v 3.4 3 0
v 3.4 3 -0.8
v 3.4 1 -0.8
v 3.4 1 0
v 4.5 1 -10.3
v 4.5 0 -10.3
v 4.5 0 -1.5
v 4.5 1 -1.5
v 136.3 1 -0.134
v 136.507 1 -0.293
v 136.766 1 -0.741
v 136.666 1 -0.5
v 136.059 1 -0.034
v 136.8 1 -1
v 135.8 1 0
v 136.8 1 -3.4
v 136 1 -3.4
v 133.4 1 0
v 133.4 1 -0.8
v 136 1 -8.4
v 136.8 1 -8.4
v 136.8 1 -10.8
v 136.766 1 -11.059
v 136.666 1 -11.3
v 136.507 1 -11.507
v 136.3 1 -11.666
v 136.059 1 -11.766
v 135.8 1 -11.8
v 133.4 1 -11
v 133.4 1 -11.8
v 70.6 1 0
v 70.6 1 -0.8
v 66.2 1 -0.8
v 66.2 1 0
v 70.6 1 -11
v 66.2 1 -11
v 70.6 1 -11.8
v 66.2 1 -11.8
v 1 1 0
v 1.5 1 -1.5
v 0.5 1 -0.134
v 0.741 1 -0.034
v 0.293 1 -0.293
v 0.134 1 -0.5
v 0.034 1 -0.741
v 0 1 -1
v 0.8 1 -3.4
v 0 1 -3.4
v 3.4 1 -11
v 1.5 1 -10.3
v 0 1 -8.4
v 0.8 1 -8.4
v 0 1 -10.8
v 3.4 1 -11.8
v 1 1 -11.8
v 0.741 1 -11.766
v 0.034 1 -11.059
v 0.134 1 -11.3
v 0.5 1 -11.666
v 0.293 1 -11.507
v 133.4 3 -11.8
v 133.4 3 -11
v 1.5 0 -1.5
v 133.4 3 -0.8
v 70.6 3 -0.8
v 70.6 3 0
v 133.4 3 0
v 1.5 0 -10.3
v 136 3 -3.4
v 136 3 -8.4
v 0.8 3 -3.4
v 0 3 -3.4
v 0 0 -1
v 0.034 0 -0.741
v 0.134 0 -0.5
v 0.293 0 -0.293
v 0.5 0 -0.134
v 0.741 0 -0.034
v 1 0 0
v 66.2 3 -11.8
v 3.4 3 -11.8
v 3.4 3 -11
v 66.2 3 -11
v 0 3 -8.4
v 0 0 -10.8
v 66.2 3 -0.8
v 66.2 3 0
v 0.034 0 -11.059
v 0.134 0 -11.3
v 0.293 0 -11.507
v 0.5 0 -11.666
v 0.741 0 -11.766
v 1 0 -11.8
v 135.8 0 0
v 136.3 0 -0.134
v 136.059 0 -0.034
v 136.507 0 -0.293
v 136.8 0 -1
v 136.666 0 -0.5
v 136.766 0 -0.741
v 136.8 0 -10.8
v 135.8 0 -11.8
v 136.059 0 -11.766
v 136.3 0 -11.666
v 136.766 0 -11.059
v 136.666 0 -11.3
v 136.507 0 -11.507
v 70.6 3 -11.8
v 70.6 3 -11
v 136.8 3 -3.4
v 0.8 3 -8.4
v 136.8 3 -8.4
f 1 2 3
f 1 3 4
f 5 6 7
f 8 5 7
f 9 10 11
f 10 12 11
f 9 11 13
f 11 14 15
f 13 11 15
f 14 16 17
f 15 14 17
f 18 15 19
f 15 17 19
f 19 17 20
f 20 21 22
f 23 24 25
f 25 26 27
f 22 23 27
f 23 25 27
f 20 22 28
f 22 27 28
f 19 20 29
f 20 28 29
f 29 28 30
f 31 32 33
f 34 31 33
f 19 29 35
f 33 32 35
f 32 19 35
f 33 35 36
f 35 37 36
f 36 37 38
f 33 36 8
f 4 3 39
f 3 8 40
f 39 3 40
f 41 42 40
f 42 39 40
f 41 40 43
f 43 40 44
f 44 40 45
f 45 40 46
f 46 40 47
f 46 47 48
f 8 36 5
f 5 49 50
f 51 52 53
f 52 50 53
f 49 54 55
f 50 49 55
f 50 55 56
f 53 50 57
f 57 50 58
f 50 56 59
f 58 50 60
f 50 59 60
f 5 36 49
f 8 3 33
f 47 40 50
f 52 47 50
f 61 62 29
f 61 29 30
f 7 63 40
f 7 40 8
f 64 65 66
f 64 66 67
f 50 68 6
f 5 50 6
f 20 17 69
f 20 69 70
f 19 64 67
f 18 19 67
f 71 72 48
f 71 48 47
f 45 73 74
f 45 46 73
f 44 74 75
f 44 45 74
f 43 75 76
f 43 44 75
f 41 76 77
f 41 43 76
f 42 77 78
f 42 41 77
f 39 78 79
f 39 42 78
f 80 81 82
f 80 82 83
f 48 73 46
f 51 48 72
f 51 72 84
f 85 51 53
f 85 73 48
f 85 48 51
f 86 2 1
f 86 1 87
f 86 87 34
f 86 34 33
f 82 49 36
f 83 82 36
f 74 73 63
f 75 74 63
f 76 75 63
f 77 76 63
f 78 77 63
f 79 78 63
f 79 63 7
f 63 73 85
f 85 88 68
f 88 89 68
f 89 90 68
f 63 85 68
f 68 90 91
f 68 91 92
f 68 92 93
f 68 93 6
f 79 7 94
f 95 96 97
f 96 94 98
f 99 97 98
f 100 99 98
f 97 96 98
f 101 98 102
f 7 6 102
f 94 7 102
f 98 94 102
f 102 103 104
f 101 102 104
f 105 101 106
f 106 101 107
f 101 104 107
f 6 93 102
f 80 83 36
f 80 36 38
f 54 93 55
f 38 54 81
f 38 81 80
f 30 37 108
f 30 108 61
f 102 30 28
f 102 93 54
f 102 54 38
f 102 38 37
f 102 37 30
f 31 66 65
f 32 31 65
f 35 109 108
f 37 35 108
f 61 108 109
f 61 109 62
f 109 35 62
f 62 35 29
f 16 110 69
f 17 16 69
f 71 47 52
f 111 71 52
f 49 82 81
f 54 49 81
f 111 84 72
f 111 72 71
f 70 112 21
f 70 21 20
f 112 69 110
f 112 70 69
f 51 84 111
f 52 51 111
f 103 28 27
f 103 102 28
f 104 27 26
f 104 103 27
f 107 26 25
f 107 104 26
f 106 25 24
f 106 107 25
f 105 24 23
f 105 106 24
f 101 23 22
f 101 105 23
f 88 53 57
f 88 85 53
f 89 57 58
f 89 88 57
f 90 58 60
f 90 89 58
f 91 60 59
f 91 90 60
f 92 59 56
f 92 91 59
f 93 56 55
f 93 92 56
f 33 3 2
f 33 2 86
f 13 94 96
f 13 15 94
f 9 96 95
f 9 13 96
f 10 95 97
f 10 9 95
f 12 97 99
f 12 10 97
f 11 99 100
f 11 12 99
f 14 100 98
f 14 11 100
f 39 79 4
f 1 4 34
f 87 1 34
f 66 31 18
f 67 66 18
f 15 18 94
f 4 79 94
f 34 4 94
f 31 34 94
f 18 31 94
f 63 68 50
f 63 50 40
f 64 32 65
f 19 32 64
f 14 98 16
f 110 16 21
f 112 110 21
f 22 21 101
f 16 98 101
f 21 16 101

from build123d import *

# Parameters (mm, degrees)
ESQUISSE1_W             = 136.8
ESQUISSE1_H             = 11.8
BOSS_EXTRU_1_DEPTH      = 1
ESQUISSE4_W             = 136.8
ESQUISSE4_H             = 11.8
ESQUISSE4_W_2           = 135.2
ESQUISSE4_H_2           = 10.2
BOSS_EXTRU_3_DEPTH      = 2
ESQUISSE5_W             = 4.4
ESQUISSE5_H             = 0.8
ENL_V_MAT_EXTRU_3_DEPTH = 2
ESQUISSE6_W             = 3
ESQUISSE6_H             = 8.8
ENL_V_MAT_EXTRU_4_DEPTH = 4
CONG_1_R                = 1


with BuildPart() as part:
    # Esquisse1 → Boss.-Extru.1 (new body)
    with BuildSketch(Plane(origin=(0, 0, 0), x_dir=(1, 0, 0), z_dir=(0, 1, 0))):
        with Locations((68.4, 5.9)):
            Rectangle(ESQUISSE1_W, ESQUISSE1_H)
    extrude(amount=BOSS_EXTRU_1_DEPTH)

    # Esquisse4 → Boss.-Extru.3 (add)
    with BuildSketch(Plane(origin=(0, 1, 0), x_dir=(1, 0, 0), z_dir=(0, 1, 0))):
        with Locations((68.4, 5.9)):
            Rectangle(ESQUISSE4_W, ESQUISSE4_H)
        with Locations((68.4, 5.9)):
            Rectangle(ESQUISSE4_W_2, ESQUISSE4_H_2, mode=Mode.SUBTRACT)
    extrude(amount=BOSS_EXTRU_3_DEPTH)

    # Esquisse5 → Enlèv. mat.-Extru.3 (cut)
    with BuildSketch(Plane(origin=(0, 3, 0), x_dir=(1, 0, 0), z_dir=(0, 1, 0))):
        Polygon((136.8, 11.8), (136.8, 8.4), (136, 8.4), (136, 11), (133.4, 11), (133.4, 11.8), align=None)
        Polygon((3.4, 11.8), (0, 11.8), (0, 8.4), (0.8, 8.4), (0.8, 11), (3.4, 11), align=None)
        with Locations((68.4, 11.4)):
            Rectangle(ESQUISSE5_W, ESQUISSE5_H)
        Polygon((0, 0), (0, 3.4), (0.8, 3.4), (0.8, 0.8), (3.4, 0.8), (3.4, 0), align=None)
        with Locations((68.4, 0.4)):
            Rectangle(ESQUISSE5_W, ESQUISSE5_H)
        Polygon((133.4, 0), (136.8, 0), (136.8, 3.4), (136, 3.4), (136, 0.8), (133.4, 0.8), align=None)
    extrude(amount=-ENL_V_MAT_EXTRU_3_DEPTH, mode=Mode.SUBTRACT)

    # Esquisse6 → Enlèv. mat.-Extru.4 (cut, through all)
    with BuildSketch(Plane.XZ):
        with Locations((3, -5.9)):
            Rectangle(ESQUISSE6_W, ESQUISSE6_H)
    extrude(amount=-ENL_V_MAT_EXTRU_4_DEPTH, mode=Mode.SUBTRACT)

    # Congé1
    cong_1_edges = [part.edges().sort_by_distance(p)[0] for p in [
        (0, 0.5, -11.8),
        (136.8, 0.5, -11.8),
        (136.8, 0.5, 0),
        (0, 0.5, 0),
    ]]
    fillet(cong_1_edges, radius=CONG_1_R)


solid = part.part
